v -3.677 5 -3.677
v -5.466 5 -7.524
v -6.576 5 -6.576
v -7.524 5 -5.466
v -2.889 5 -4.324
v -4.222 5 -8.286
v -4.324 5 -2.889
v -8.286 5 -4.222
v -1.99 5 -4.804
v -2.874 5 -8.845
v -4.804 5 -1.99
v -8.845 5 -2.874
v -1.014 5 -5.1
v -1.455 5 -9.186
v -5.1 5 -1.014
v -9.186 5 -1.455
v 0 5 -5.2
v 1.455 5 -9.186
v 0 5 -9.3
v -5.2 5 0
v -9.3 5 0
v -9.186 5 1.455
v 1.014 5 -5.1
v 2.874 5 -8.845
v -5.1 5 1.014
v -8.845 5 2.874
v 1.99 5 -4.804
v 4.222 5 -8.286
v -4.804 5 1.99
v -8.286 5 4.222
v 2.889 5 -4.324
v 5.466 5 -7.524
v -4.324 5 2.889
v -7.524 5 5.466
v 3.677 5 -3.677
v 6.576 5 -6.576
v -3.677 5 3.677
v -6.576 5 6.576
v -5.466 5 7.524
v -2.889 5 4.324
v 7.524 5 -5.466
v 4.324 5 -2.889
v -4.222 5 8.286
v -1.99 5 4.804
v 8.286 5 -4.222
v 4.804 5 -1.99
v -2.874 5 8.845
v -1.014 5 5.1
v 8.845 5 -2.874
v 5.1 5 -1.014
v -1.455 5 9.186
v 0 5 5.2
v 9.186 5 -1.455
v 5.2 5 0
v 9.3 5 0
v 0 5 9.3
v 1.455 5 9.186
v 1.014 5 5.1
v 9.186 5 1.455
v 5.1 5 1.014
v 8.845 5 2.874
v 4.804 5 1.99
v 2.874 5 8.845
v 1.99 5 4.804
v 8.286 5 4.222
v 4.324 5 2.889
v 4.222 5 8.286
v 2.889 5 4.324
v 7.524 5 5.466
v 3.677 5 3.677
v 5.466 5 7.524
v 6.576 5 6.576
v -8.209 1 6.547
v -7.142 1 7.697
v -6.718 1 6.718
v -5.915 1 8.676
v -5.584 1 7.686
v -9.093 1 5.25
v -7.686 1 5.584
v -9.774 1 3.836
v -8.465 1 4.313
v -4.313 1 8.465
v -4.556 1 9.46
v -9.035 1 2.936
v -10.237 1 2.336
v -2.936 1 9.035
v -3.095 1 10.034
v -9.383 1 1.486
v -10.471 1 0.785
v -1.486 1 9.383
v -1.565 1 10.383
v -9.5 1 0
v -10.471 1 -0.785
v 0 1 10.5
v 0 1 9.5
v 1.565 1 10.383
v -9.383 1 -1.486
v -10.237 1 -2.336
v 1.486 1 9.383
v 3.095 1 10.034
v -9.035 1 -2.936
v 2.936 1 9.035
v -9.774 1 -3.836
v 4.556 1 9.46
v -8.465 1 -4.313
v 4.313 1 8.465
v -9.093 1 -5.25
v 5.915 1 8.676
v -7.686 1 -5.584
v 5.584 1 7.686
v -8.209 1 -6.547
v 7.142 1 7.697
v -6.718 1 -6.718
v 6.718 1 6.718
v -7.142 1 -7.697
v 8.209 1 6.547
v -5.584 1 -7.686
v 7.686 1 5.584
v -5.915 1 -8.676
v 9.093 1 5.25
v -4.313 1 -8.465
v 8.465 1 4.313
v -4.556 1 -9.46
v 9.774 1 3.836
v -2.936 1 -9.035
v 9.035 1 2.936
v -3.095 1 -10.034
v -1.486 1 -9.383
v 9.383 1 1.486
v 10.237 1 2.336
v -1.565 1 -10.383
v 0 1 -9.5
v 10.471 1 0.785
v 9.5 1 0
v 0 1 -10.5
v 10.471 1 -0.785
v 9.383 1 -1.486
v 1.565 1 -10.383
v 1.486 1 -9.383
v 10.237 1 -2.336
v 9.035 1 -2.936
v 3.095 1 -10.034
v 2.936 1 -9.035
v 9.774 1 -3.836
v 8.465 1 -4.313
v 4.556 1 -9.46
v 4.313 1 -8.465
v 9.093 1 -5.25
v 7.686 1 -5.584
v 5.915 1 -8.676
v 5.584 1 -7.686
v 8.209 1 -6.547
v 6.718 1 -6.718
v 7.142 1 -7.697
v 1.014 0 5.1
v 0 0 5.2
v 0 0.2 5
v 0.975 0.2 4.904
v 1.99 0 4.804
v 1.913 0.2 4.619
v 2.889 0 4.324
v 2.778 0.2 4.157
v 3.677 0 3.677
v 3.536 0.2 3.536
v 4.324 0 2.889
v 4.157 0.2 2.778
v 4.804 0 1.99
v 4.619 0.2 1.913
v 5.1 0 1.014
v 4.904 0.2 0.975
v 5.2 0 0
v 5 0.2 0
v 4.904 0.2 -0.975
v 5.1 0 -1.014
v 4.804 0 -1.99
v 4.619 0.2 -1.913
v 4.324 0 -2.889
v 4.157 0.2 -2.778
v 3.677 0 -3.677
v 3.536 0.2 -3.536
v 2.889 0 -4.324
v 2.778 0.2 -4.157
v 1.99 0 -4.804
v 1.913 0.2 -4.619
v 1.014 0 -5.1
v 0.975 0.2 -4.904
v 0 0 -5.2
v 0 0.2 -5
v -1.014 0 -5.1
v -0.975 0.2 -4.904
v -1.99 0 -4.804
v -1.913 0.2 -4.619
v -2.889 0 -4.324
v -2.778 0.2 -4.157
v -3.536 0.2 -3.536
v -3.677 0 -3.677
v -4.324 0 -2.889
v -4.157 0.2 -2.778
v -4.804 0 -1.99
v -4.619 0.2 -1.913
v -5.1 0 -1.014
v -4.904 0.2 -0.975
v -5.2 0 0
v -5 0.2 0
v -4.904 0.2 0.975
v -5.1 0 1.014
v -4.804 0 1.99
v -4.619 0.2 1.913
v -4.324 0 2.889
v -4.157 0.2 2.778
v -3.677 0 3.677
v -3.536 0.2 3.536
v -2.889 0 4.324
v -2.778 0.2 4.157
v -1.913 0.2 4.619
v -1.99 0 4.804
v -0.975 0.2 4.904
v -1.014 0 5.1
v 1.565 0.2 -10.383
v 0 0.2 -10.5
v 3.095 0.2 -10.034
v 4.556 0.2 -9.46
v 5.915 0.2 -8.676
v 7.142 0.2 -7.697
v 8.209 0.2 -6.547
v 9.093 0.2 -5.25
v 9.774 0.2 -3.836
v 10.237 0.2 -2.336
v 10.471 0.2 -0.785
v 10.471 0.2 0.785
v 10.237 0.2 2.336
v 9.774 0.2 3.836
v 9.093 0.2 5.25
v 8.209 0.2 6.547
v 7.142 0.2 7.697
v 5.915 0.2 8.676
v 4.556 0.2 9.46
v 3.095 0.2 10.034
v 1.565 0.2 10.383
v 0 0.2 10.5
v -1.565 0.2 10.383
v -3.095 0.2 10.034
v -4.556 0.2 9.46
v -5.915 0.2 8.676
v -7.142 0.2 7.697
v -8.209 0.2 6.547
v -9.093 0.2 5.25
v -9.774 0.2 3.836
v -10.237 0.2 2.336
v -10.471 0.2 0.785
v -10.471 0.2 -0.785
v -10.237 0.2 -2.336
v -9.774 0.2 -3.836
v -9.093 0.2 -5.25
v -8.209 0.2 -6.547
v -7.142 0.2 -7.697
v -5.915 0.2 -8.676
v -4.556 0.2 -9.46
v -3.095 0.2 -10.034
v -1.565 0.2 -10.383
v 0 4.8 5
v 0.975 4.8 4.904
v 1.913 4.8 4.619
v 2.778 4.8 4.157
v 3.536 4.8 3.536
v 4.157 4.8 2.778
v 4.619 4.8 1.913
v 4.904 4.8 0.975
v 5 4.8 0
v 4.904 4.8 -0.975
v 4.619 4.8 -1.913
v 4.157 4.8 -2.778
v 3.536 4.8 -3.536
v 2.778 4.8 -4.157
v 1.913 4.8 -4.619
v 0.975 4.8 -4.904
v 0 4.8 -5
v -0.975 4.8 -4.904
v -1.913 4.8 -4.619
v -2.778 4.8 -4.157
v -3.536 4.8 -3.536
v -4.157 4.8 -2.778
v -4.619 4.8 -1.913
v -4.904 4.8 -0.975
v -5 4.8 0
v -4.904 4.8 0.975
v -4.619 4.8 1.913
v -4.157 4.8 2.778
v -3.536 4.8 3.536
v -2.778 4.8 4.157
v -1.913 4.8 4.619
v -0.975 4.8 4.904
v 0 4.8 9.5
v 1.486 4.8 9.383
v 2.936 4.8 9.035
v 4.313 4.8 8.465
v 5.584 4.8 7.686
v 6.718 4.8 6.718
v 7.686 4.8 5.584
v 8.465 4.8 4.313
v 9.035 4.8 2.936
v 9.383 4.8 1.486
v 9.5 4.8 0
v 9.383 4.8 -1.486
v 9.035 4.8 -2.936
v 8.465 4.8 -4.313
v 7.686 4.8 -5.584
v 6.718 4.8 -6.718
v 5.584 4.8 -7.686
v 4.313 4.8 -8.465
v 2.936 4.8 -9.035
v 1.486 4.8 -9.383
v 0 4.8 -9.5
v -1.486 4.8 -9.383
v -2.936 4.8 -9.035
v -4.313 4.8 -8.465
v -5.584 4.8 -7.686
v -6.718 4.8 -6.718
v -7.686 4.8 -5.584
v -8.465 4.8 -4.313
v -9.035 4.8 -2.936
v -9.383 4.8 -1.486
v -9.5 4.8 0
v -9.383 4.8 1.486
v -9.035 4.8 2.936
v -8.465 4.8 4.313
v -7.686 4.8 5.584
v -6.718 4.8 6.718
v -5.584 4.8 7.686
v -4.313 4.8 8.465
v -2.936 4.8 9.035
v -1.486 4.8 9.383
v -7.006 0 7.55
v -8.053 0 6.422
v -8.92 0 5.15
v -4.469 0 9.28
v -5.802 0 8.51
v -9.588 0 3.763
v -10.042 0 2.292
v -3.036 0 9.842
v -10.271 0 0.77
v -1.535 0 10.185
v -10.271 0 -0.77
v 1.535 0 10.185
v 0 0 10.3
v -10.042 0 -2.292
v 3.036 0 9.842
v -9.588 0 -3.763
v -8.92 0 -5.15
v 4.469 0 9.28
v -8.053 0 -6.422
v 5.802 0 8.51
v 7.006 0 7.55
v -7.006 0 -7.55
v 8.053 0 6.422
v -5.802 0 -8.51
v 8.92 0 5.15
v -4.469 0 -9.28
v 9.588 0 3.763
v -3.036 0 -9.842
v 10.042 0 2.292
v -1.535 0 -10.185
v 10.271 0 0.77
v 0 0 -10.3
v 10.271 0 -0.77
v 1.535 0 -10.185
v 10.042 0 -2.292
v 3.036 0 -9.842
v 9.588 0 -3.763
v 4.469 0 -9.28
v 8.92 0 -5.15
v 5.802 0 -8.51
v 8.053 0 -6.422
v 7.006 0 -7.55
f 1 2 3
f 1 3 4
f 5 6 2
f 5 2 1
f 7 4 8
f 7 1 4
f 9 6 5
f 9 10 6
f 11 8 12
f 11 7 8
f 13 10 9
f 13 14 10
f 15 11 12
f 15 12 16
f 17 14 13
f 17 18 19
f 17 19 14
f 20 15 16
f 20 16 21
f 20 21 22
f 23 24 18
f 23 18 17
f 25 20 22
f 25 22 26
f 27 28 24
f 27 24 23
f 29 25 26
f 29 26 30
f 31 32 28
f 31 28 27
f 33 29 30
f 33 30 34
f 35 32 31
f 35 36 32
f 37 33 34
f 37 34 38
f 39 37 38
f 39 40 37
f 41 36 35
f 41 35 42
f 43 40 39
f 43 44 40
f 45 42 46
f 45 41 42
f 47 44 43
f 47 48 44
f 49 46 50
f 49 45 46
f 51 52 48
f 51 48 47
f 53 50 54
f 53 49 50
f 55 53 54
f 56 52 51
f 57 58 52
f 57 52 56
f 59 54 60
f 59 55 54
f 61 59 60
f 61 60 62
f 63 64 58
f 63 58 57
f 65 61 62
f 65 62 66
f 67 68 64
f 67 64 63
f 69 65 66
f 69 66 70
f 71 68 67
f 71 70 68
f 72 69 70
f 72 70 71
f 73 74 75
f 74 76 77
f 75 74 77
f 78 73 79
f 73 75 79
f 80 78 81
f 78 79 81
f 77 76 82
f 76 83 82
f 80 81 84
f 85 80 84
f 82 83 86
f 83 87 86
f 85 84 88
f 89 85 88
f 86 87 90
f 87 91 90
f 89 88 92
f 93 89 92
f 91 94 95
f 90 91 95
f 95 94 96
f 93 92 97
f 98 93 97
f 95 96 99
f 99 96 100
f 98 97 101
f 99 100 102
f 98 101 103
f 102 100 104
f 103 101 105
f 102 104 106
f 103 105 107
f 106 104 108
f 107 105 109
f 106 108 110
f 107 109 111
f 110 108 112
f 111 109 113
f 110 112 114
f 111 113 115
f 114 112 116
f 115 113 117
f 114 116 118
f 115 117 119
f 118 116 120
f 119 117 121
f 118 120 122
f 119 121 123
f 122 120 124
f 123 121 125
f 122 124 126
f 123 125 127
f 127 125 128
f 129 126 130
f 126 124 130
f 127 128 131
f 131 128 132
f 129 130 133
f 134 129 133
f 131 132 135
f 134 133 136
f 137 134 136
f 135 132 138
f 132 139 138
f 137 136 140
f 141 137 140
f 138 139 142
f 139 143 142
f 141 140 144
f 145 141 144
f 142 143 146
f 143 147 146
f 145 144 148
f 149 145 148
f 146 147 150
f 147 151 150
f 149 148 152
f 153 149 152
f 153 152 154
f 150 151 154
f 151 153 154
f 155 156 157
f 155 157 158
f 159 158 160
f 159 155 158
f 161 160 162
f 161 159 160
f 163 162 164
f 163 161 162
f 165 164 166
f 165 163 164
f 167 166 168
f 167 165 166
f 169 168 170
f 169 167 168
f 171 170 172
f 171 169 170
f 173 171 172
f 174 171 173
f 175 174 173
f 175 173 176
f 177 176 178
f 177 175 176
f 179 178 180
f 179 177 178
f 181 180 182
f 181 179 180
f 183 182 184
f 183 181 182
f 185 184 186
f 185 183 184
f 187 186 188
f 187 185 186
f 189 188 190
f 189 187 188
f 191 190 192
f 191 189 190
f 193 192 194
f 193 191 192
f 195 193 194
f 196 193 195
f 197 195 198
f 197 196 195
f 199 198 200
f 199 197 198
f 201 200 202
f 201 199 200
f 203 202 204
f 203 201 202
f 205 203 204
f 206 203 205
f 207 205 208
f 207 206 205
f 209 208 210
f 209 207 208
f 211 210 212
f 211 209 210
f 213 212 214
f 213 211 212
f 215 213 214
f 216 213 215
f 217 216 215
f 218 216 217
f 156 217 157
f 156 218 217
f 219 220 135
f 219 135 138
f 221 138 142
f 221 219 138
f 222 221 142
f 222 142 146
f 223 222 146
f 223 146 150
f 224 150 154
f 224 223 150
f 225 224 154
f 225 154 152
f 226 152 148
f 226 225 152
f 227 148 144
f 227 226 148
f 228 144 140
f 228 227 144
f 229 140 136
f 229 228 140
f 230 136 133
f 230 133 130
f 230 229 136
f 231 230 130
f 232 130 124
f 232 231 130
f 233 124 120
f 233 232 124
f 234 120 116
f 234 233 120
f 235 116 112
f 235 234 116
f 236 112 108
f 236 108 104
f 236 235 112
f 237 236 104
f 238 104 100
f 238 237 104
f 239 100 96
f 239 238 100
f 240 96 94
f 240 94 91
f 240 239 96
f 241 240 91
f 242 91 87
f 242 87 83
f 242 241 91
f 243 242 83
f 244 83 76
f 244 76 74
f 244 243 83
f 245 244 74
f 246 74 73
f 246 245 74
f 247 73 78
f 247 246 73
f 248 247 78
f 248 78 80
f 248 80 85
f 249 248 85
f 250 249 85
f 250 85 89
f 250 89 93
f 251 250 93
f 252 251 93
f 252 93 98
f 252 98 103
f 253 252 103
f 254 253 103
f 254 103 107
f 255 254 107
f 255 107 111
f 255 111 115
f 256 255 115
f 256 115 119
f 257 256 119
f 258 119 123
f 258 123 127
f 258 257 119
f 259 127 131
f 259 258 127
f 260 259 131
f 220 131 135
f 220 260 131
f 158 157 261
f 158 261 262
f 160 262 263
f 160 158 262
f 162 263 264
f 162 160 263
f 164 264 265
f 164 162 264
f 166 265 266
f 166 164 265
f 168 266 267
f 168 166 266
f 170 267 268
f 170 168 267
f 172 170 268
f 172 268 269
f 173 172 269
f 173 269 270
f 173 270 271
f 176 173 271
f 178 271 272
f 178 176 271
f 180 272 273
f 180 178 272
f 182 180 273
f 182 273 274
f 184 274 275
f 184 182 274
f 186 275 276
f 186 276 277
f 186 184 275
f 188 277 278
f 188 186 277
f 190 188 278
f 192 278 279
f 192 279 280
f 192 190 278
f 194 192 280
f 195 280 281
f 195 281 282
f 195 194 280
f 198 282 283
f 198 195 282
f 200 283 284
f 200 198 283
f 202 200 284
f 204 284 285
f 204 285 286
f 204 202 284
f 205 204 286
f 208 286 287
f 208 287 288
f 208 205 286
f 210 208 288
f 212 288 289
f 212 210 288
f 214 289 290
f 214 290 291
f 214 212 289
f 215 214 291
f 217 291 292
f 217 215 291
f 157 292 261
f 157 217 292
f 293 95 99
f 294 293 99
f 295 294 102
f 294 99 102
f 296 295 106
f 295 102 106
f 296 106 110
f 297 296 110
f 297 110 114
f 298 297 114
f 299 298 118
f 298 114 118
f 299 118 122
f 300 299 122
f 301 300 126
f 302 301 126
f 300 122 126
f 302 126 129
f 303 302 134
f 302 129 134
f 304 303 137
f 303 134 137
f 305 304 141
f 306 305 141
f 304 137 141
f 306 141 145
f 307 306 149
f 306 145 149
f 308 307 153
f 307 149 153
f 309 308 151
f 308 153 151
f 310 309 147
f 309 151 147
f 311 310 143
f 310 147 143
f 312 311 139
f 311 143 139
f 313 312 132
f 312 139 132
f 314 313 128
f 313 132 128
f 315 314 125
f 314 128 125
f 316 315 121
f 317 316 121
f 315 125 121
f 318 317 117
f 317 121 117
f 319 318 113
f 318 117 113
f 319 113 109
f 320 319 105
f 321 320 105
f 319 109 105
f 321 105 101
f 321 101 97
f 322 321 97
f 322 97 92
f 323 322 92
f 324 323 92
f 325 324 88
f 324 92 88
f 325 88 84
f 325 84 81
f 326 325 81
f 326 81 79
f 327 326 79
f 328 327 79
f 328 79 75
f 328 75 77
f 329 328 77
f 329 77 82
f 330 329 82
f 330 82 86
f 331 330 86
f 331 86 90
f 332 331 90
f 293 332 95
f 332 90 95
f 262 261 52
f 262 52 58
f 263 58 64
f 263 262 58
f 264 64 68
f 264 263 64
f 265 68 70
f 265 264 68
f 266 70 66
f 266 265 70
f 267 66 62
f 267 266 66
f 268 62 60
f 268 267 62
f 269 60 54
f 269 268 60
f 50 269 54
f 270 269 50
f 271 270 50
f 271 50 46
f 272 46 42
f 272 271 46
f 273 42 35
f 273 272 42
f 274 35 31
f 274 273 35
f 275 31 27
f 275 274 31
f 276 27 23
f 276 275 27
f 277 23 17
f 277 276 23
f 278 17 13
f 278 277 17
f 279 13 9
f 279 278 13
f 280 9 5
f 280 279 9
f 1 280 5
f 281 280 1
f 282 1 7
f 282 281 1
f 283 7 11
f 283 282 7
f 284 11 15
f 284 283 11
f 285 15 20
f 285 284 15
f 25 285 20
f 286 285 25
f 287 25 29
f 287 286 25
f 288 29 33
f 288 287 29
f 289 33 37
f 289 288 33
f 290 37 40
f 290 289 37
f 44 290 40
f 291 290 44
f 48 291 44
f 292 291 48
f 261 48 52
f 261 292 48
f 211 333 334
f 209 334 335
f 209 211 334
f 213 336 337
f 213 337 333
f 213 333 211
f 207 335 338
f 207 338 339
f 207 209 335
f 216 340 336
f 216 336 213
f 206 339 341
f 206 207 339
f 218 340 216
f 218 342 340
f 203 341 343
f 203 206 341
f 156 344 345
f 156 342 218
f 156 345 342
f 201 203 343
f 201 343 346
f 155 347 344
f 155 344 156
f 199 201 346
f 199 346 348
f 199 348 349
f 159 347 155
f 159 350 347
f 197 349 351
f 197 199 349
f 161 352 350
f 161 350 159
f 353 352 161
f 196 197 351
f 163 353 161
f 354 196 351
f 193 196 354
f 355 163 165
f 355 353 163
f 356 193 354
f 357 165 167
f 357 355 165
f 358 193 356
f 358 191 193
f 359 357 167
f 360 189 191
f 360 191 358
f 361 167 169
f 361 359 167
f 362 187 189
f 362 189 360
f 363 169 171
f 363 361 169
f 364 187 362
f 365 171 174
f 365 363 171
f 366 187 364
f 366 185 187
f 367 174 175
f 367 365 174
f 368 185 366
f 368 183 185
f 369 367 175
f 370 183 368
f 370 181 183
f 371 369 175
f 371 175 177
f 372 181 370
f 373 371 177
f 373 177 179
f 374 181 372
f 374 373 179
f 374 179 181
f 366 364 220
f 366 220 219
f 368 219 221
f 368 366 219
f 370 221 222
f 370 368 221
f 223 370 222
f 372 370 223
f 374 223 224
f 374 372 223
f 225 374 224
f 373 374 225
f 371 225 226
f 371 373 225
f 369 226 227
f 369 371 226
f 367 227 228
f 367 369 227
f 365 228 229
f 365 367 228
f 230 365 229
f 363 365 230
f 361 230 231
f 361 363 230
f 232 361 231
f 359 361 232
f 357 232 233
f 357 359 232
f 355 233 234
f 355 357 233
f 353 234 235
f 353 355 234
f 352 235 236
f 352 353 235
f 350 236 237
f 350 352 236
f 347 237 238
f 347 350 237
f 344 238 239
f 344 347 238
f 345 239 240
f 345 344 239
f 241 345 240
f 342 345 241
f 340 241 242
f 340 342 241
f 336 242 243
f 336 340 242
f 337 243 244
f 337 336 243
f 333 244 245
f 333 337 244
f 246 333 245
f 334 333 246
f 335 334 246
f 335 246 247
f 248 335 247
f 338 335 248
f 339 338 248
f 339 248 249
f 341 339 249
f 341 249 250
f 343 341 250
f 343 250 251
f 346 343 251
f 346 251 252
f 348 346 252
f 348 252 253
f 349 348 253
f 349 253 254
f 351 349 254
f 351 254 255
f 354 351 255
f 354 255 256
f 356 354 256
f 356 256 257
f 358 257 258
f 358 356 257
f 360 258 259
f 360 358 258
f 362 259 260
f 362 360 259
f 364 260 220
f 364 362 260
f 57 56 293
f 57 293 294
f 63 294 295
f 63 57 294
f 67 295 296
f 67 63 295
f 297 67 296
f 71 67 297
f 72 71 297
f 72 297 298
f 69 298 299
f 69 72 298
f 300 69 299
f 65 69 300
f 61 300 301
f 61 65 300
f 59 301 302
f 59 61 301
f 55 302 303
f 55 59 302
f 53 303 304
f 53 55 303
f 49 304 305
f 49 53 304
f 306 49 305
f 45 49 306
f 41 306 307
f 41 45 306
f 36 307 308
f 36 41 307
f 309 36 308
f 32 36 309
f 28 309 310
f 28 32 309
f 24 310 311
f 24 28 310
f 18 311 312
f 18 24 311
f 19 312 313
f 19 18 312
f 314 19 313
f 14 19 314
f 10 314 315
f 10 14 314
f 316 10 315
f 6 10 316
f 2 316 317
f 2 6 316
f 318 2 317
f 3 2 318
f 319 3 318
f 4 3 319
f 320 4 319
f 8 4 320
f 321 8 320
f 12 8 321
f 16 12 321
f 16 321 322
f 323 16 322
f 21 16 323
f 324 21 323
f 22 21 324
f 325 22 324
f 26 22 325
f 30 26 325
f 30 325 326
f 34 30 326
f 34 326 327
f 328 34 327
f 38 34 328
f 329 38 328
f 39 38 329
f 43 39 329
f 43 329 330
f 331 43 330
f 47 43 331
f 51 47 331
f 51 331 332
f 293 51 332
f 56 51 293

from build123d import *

# Parameters (mm, degrees)
SKETCH_1_R      = 9.5
SKETCH_1_R_2    = 5
EXTRUDE_1_DEPTH = 5
SKETCH_2_R      = 10.5
SKETCH_2_R_2    = 9.5
EXTRUDE_2_DEPTH = 1
CHAMFER_1_SIZE  = 0.2


with BuildPart() as part:
    # 草图1 → 凸台-拉伸1 (new body)
    with BuildSketch(Plane(origin=(0, 0, 0), x_dir=(1, 0, 0), z_dir=(0, 1, 0))):
        with Locations(Location((0, 0, 0), (0, 0, 270))):
            Circle(SKETCH_1_R)
        with Locations(Location((0, 0, 0), (0, 0, 270))):
            Circle(SKETCH_1_R_2, mode=Mode.SUBTRACT)
    extrude(amount=EXTRUDE_1_DEPTH)

    # 草图2 → 凸台-拉伸2 (add)
    with BuildSketch(Plane.XZ):
        with Locations(Location((0, 0, 0), (0, 0, 270))):
            Circle(SKETCH_2_R)
        with Locations(Location((0, 0, 0), (0, 0, 270))):
            Circle(SKETCH_2_R_2, mode=Mode.SUBTRACT)
    extrude(amount=-EXTRUDE_2_DEPTH)

    # 倒角1
    chamfer_1_edges = [part.edges().sort_by_distance(p)[0] for p in [
        (0, 0, 10.5),
        (0, 5, -9.5),
        (0, 0, -5),
        (0, 5, -5),
    ]]
    chamfer(chamfer_1_edges, length=CHAMFER_1_SIZE)


solid = part.part
